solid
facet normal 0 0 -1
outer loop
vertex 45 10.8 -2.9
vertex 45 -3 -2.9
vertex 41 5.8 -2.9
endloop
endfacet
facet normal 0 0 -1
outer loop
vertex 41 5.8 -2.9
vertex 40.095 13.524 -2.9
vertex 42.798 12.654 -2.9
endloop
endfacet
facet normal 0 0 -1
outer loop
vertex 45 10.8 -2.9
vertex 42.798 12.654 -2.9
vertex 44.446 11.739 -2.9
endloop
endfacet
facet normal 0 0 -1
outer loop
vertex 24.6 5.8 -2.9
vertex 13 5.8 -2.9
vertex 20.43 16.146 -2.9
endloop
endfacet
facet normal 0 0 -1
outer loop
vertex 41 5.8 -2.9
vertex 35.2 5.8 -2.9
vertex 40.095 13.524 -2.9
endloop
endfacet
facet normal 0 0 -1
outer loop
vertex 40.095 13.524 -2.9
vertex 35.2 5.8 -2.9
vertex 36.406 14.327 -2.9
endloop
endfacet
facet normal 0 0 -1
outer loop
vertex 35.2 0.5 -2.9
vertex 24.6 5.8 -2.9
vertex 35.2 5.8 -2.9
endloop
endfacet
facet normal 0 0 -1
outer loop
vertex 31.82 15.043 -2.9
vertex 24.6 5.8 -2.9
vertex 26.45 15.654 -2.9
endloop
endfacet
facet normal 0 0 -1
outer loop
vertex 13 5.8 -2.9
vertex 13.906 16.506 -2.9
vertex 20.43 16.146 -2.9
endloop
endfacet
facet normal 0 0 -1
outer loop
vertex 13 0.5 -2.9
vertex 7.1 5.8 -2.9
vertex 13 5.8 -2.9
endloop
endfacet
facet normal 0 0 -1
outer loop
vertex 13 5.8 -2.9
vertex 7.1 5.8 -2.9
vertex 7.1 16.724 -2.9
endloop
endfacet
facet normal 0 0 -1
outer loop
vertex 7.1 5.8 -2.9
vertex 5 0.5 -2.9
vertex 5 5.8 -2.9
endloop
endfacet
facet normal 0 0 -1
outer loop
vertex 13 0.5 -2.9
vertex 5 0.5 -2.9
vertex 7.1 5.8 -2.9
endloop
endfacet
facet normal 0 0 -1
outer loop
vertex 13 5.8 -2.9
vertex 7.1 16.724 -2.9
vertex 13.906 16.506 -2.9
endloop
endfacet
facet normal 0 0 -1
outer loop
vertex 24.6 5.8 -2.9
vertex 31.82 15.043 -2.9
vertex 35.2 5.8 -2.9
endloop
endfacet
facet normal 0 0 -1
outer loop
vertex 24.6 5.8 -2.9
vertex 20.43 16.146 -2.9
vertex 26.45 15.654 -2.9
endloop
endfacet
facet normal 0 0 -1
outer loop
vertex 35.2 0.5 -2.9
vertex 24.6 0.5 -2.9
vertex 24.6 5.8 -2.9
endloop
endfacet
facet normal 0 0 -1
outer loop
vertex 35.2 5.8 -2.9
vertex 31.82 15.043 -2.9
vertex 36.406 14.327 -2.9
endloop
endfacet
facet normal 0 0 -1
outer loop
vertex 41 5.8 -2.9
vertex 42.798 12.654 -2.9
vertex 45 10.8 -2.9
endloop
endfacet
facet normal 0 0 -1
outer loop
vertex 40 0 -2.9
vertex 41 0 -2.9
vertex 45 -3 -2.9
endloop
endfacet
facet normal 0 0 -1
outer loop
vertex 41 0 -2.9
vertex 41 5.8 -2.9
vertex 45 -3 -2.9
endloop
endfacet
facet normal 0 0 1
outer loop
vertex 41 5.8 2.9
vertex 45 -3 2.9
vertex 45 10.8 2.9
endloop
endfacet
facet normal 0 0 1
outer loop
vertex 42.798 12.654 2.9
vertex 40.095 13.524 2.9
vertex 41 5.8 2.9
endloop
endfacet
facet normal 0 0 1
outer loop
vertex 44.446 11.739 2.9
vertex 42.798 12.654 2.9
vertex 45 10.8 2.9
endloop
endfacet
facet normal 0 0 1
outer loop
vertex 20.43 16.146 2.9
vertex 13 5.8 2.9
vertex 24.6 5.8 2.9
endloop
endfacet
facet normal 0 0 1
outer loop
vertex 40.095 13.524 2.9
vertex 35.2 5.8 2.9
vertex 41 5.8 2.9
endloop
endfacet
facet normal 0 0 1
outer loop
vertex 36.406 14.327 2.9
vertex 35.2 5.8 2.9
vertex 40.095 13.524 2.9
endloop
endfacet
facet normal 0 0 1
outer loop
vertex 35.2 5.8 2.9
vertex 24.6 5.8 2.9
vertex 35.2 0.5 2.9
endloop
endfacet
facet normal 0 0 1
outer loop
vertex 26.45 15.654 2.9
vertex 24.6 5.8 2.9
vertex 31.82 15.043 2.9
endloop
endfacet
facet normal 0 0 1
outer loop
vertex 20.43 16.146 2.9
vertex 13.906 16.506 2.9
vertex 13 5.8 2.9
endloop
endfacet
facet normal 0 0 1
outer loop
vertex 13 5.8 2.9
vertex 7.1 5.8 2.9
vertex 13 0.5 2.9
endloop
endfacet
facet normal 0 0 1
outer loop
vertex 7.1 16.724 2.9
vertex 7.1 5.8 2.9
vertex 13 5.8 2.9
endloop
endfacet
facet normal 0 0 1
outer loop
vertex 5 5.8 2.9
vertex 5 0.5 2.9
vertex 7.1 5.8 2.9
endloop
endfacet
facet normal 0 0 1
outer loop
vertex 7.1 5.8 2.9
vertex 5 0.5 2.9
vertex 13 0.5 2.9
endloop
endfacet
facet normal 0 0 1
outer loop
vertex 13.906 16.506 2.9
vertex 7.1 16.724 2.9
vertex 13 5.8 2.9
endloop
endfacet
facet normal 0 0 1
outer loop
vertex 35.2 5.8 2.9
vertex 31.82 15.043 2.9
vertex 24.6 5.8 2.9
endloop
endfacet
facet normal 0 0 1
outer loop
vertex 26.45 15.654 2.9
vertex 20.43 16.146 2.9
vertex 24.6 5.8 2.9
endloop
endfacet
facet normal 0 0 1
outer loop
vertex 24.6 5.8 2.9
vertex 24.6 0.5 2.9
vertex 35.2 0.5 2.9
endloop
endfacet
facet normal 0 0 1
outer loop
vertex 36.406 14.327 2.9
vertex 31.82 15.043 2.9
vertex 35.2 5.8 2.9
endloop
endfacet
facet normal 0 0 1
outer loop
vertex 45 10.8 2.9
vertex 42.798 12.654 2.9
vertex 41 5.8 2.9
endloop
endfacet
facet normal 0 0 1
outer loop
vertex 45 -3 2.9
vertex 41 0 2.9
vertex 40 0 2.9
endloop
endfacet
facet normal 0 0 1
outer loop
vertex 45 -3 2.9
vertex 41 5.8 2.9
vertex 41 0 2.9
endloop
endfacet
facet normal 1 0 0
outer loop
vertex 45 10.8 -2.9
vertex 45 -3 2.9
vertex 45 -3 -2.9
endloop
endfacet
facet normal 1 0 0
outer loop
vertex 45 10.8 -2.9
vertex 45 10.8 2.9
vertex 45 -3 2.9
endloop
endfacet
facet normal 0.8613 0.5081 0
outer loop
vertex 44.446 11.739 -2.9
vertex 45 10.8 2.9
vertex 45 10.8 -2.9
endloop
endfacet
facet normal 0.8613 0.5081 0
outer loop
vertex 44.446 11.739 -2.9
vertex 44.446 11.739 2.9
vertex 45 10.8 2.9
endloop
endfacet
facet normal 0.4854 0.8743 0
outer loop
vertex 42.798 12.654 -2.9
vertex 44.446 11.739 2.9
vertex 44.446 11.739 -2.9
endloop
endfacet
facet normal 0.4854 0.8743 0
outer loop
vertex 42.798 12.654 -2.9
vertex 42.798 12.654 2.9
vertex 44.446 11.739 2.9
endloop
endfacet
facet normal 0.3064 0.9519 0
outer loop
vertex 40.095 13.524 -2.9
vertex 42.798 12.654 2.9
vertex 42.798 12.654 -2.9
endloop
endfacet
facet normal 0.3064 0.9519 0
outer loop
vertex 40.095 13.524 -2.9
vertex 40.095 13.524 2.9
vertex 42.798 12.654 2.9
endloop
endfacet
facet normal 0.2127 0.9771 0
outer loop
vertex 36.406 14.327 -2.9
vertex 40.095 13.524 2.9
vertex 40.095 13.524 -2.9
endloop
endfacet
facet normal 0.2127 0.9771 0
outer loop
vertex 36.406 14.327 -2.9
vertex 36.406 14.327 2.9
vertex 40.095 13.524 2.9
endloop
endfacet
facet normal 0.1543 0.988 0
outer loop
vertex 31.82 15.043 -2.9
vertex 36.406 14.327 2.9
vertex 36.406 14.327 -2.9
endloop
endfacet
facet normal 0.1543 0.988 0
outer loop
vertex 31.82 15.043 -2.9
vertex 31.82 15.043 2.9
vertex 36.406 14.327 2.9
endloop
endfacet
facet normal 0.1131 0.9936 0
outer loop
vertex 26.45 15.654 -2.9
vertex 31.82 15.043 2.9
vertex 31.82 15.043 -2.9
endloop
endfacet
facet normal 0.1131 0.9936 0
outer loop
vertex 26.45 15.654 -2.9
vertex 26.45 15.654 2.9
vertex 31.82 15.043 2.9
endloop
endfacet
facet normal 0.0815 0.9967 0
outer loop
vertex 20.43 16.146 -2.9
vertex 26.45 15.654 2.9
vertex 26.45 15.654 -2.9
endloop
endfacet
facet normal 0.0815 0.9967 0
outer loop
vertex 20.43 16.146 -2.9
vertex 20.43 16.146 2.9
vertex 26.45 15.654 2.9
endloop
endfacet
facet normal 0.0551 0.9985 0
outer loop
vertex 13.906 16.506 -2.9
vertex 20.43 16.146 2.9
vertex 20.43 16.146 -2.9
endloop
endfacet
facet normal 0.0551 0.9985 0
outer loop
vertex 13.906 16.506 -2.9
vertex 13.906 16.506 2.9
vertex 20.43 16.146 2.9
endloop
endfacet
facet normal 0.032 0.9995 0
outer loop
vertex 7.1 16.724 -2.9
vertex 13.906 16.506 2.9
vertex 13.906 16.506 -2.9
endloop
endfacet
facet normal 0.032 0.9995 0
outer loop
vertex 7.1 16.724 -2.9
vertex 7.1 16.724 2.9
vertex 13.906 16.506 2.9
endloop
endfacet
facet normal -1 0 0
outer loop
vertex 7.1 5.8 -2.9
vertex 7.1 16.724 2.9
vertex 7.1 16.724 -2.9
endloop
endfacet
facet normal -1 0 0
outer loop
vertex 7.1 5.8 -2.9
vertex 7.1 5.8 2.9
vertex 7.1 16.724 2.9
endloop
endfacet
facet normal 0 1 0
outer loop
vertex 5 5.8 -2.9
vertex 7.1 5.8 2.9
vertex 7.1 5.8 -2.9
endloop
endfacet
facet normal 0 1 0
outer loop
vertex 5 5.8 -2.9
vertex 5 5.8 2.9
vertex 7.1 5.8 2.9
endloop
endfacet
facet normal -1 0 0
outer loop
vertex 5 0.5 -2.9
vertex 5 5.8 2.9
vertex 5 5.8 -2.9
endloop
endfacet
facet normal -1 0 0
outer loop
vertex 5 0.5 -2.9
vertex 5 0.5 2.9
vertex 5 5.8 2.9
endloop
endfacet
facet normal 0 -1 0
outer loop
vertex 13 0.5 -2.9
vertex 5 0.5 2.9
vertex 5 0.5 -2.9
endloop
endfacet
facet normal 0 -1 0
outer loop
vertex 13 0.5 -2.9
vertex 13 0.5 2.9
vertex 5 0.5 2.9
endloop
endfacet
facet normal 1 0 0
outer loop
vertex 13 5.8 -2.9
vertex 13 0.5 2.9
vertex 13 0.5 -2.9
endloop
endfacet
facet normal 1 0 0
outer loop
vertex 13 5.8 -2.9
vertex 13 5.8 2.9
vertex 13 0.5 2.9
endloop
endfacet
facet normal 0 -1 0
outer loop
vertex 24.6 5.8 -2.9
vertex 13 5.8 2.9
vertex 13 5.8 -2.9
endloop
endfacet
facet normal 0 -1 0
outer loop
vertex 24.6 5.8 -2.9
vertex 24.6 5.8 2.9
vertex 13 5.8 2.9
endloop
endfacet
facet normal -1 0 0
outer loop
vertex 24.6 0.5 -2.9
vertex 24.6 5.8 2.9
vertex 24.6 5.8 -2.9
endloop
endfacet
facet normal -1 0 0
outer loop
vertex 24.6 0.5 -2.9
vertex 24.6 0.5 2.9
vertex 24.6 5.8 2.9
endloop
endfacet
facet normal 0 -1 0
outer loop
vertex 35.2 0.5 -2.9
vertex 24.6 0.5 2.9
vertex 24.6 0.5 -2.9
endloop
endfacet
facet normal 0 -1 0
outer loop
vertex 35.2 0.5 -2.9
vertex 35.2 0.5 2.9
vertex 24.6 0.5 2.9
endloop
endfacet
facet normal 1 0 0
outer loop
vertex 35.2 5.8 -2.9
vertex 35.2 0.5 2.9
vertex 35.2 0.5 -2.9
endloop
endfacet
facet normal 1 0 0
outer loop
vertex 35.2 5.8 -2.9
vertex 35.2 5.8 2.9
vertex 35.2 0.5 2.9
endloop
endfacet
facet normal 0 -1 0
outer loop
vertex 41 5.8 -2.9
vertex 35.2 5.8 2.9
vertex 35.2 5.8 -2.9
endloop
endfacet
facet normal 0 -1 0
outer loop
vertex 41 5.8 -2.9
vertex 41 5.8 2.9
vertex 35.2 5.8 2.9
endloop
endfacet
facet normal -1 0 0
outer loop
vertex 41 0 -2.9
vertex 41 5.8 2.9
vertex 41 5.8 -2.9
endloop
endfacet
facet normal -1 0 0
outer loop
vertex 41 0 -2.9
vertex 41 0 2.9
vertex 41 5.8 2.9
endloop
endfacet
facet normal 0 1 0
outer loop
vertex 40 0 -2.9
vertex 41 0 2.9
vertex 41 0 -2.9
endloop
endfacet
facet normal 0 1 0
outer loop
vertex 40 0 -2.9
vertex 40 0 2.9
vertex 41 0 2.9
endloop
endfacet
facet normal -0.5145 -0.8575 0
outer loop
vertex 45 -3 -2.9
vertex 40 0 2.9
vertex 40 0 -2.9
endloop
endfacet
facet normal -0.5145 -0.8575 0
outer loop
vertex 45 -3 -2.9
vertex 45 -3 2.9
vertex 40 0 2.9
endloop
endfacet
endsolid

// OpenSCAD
// file: formulas.scad
// Arm length function
function arm_length(l2, R, v) = 1/2*(sqrt(2)*sqrt(pow(l2, 2)*cos(2*v)-pow(l2, 2)+2*pow(R, 2))-2*l2*cos(v));
  
//Distance between 2 points
function distance(p1, p2) = sqrt(pow(p2[0]-p1[0], 2) + pow(p2[1]-p1[1], 2));

// Maximum distortion for angular x
function max_distortion(R, d1, d2) = R-sqrt(pow(R, 2) - pow((d2-d1), 2)/4);
  
// file: dimensions.scad
use <formulas.scad>;

$fn=40;

// Global
span_bottle=100; 
bottle_rod_diam=10; 
front_rod_diam=10; 
width=470;
span_bottom=160; // Bottom rods span
span_bottle=120; // Bottle rods span
board_thickness=6;
nut_t=6;
back_tilt_angle=20;

bushings_diam=15;
bushings_length=24;
bushings_hole_length=24.2;

strap_hole_dim=[4, 2];

// Bottle grip
bottle_axle_diam=8;
bottle_axle_pos=[span_bottom-sin(back_tilt_angle)*span_bottle/2, cos(back_tilt_angle)*span_bottle/2];

bottle_grip_bottom_diam=90;
bottle_grip_bottom_height=6;
bottle_grip_bottom_cone_height=4;

bottle_grip_top_diam=50;
bottle_grip_top_height=5;
bottle_grip_top_cone_height=20;
bottle_grip_top_diam=50;
bottle_grip_top_inner_diam=45;
bottle_pulley_teeth=62;


// Sides
holes_margin=25; 
axle_position=[0,0];
break_position=[70, 50];
axis_z=40;
bearing_extrusion_height=7.2;
bearing_extrusion_length=26;
bearing_axle_extrusion_height=20;
bearing_axle_extrusion_length=7.5;

//x_top_rod_position=[0,bottle_axle_pos[1] + x_rods_span/2];
bottom_extrusion_height=5;
bottle_top_rod_position=[span_bottom-sin(back_tilt_angle)*span_bottle, cos(back_tilt_angle)*span_bottle];

// Right side
bottle_axis_diam=15;
stepper_slide_distance=10;
a_stepper_pos=[span_bottom*0.4, 10];
stepper_rotation=atan((bottle_axle_pos[1]-a_stepper_pos[1])/(bottle_axle_pos[0]-a_stepper_pos[0]));
servo_distance_from_axle=50;

// Left side

// X table
x_a_distance=85;
x_table_tilt=0;
x_rods_span=50;
rod_ext=10;
table_rod_ext=10;
table_rods_diam=8;

// X stepper mount
x_stepper_mount_length = 40;
x_stepper_mount_width = x_rods_span + 10;

x_table_width=width+x_stepper_mount_length + 2*board_thickness;

// X carriage
//carriage_length= 24; // single bushing
carriage_length=65; // double bushings
carriage_height=x_rods_span+20;
carriage_rounding_radius = 10;
carriage_bushing_hole_width = 10.5;
z_rods_length=70;
z_rods_diam=8;
z_bar_width=20;
z_pos=-10;
z_bushings_diam=15;
z_bolt_diam=3;
z_rods_span=41;
z_bushings_pos = x_rods_span/2;
solenoid_dim = [27, 22, 25];
solenoid_pos=0;
plate_distance = sqrt(pow(bushings_diam/2, 2) - pow(carriage_bushing_hole_width/2, 2)) + board_thickness/2; // Calculates plate distance (depending on carriage_bushing_hole_width
echo("Plate distance:", plate_distance*2 + board_thickness);
z_plate_dist = 5;
z_bushings_hole_width = 2*sqrt(pow(bushings_diam/2, 2) - pow(z_plate_dist, 2));

// Calculations for x table position
xz_span = plate_distance + z_plate_dist + board_thickness/2;
x_top_rod_position=[bottle_axle_pos[0] - cos(x_table_tilt)*(x_a_distance) + sin(x_table_tilt)*(-xz_span), bottle_axle_pos[1] + sin(x_table_tilt)*(x_a_distance) + cos(x_table_tilt)*(-xz_span)];
x_btm_rod_position=[bottle_axle_pos[0] - cos(x_table_tilt)*(x_a_distance + x_rods_span) + sin(x_table_tilt)*(-xz_span), bottle_axle_pos[1] + sin(x_table_tilt)*(x_a_distance + x_rods_span) + cos(x_table_tilt)*(-xz_span)];

// Bottle
bottle_pos=30;
bottle_diam=100;
bottle_height=360;

// Bottle bar
bottle_bar_width=40;
bottle_bar_height=span_bottle;
bottle_bar_pos=bottle_height+bottle_pos+40;

bearing_hole_diam=13;
bearing_guide_diam=22;


// Pulley properties
shaftDiameter = 8; // the shaft at the center, will be subtracted from the pulley. Better be too small than too wide.
hubDiameter = 30; // if the hub or timing pulley is big enough to fit a nut, this will be embedded.
hubHeight = 8; // the hub is the thick cylinder connected to the pulley to allow a set screw to go through or as a collar for a nut.
flanges = 2; // the rims that keep the belt from going anywhere
hubSetScewDiameter = 0; // use either a set screw or nut on a shaft. Set to 0 to not use a set screw.
numSetScrews = 3;
bottle_pulley_teeth = ceil(7.1*16); // this value together with the pitch determines the pulley diameter
echo("Teeth:", bottle_pulley_teeth);

toothType = 1; // 1 = slightly rounded, 2 = oval sharp, 3 = square. For square, set the toothWith a little low.

// Belt properties:
pitch = 2; // distance between the teeth
beltWidth = 6; // the width/height of the belt. The (vertical) size of the pulley is adapted to this.
beltThickness = 0.65; // thickness of the part excluding the notch depth!
notchDepth = 0.8; // make it slightly bigger than actual, there's an outward curvature in the inner solid part of the pulley
toothWidth = 1.2; // Teeth of the PULLEY, that is.
// main file
include <dimensions.scad>;

module btm_grip_support() {
  t = board_thickness-0.2;
  margin = 5;
  linear_extrude(t, center=true)
  union() {
    difference() {
      union() {
        translate([0, t + margin]) scale([bottle_grip_bottom_diam/2, bottle_grip_bottom_height]) circle();
        square([bottle_grip_bottom_diam/2, t + margin]);
      }
      union() {
        mirror([1, 0, 0]) square([1000, 1000]);
        mirror([0, 1, 0]) translate([-500, 0, 0]) square([1000, 1000]);
       translate([0, -1]) square([bottle_axle_diam/2 + 1, t + 2]);
       translate([0, t]) square([14.2/2, bottle_grip_bottom_height + margin + 1]);
       translate([bottle_axle_diam + 5, -1]) square([t*2, t+1]);
       translate([bottle_grip_bottom_diam/2 - t - 4, -1]) square([t, t+1]);
       square([bottle_grip_bottom_diam/2 - t - 4, 0.5]);
      }
    }
  points=[[0, 0], [-5, 0], [0, -3]];
  translate([bottle_grip_bottom_diam/2, 0]) polygon(points);
  //translate([bottle_axle_diam + 1, 0]) mirror([1, 0, 0]) polygon(points);
  }
  
}

module btm_grip_support2(t=5.3, tol=0.25) {
  l=bottle_grip_bottom_diam/2;
  margin=3;

  points = [
    [bottle_axle_diam/2 - tol, 0],
    [15 + tol, 0],
    [15 + tol, t - tol],
    [20 - tol, t - tol],
    [20 - tol, 0],
    [30 + tol, 0],
    [30 + tol, t - tol],
    [35 - tol, t - tol],
    [35 - tol, 0],
    [l, 0],
    [l, t + margin],
    [13/2 - tol, t + margin + bottle_grip_bottom_height],

  ];

  polygon(points);
}

module btm_plate() {
  t = board_thickness - 0.2;
  linear_extrude(board_thickness, center=true)
  difference() {
    circle(r=bottle_grip_bottom_diam/2);
    circle(r=bottle_axle_diam/2 + 2);
    union() {
      for (i=[0:6]) {
        rotate(i*360/6, [0, 0, 1])
          projection(cut=true) translate([0, 0, -t/2]) rotate([90, 0, 0]) btm_grip_support();
      }
    }
  }
}

module btm_plate2() {
  linear_extrude(board_thickness, center=true) 
  difference() {
    circle(r=bottle_grip_bottom_diam/2 - 5);
    circle(bottle_axle_diam/2);
  }
}

module bottom_grip() {
  btm_plate2();
  translate([0, 0, board_thickness]) btm_plate();
  translate([0, 0, board_thickness]) 
  for (i=[0:6]) {
    rotate(i*360/6, [0, 0, 1])
    translate([0, 0, -board_thickness/2]) rotate([90, 0, 0]) btm_grip_support();
  }
}


//bottom_grip();
btm_grip_support();
//btm_grip_support2();
